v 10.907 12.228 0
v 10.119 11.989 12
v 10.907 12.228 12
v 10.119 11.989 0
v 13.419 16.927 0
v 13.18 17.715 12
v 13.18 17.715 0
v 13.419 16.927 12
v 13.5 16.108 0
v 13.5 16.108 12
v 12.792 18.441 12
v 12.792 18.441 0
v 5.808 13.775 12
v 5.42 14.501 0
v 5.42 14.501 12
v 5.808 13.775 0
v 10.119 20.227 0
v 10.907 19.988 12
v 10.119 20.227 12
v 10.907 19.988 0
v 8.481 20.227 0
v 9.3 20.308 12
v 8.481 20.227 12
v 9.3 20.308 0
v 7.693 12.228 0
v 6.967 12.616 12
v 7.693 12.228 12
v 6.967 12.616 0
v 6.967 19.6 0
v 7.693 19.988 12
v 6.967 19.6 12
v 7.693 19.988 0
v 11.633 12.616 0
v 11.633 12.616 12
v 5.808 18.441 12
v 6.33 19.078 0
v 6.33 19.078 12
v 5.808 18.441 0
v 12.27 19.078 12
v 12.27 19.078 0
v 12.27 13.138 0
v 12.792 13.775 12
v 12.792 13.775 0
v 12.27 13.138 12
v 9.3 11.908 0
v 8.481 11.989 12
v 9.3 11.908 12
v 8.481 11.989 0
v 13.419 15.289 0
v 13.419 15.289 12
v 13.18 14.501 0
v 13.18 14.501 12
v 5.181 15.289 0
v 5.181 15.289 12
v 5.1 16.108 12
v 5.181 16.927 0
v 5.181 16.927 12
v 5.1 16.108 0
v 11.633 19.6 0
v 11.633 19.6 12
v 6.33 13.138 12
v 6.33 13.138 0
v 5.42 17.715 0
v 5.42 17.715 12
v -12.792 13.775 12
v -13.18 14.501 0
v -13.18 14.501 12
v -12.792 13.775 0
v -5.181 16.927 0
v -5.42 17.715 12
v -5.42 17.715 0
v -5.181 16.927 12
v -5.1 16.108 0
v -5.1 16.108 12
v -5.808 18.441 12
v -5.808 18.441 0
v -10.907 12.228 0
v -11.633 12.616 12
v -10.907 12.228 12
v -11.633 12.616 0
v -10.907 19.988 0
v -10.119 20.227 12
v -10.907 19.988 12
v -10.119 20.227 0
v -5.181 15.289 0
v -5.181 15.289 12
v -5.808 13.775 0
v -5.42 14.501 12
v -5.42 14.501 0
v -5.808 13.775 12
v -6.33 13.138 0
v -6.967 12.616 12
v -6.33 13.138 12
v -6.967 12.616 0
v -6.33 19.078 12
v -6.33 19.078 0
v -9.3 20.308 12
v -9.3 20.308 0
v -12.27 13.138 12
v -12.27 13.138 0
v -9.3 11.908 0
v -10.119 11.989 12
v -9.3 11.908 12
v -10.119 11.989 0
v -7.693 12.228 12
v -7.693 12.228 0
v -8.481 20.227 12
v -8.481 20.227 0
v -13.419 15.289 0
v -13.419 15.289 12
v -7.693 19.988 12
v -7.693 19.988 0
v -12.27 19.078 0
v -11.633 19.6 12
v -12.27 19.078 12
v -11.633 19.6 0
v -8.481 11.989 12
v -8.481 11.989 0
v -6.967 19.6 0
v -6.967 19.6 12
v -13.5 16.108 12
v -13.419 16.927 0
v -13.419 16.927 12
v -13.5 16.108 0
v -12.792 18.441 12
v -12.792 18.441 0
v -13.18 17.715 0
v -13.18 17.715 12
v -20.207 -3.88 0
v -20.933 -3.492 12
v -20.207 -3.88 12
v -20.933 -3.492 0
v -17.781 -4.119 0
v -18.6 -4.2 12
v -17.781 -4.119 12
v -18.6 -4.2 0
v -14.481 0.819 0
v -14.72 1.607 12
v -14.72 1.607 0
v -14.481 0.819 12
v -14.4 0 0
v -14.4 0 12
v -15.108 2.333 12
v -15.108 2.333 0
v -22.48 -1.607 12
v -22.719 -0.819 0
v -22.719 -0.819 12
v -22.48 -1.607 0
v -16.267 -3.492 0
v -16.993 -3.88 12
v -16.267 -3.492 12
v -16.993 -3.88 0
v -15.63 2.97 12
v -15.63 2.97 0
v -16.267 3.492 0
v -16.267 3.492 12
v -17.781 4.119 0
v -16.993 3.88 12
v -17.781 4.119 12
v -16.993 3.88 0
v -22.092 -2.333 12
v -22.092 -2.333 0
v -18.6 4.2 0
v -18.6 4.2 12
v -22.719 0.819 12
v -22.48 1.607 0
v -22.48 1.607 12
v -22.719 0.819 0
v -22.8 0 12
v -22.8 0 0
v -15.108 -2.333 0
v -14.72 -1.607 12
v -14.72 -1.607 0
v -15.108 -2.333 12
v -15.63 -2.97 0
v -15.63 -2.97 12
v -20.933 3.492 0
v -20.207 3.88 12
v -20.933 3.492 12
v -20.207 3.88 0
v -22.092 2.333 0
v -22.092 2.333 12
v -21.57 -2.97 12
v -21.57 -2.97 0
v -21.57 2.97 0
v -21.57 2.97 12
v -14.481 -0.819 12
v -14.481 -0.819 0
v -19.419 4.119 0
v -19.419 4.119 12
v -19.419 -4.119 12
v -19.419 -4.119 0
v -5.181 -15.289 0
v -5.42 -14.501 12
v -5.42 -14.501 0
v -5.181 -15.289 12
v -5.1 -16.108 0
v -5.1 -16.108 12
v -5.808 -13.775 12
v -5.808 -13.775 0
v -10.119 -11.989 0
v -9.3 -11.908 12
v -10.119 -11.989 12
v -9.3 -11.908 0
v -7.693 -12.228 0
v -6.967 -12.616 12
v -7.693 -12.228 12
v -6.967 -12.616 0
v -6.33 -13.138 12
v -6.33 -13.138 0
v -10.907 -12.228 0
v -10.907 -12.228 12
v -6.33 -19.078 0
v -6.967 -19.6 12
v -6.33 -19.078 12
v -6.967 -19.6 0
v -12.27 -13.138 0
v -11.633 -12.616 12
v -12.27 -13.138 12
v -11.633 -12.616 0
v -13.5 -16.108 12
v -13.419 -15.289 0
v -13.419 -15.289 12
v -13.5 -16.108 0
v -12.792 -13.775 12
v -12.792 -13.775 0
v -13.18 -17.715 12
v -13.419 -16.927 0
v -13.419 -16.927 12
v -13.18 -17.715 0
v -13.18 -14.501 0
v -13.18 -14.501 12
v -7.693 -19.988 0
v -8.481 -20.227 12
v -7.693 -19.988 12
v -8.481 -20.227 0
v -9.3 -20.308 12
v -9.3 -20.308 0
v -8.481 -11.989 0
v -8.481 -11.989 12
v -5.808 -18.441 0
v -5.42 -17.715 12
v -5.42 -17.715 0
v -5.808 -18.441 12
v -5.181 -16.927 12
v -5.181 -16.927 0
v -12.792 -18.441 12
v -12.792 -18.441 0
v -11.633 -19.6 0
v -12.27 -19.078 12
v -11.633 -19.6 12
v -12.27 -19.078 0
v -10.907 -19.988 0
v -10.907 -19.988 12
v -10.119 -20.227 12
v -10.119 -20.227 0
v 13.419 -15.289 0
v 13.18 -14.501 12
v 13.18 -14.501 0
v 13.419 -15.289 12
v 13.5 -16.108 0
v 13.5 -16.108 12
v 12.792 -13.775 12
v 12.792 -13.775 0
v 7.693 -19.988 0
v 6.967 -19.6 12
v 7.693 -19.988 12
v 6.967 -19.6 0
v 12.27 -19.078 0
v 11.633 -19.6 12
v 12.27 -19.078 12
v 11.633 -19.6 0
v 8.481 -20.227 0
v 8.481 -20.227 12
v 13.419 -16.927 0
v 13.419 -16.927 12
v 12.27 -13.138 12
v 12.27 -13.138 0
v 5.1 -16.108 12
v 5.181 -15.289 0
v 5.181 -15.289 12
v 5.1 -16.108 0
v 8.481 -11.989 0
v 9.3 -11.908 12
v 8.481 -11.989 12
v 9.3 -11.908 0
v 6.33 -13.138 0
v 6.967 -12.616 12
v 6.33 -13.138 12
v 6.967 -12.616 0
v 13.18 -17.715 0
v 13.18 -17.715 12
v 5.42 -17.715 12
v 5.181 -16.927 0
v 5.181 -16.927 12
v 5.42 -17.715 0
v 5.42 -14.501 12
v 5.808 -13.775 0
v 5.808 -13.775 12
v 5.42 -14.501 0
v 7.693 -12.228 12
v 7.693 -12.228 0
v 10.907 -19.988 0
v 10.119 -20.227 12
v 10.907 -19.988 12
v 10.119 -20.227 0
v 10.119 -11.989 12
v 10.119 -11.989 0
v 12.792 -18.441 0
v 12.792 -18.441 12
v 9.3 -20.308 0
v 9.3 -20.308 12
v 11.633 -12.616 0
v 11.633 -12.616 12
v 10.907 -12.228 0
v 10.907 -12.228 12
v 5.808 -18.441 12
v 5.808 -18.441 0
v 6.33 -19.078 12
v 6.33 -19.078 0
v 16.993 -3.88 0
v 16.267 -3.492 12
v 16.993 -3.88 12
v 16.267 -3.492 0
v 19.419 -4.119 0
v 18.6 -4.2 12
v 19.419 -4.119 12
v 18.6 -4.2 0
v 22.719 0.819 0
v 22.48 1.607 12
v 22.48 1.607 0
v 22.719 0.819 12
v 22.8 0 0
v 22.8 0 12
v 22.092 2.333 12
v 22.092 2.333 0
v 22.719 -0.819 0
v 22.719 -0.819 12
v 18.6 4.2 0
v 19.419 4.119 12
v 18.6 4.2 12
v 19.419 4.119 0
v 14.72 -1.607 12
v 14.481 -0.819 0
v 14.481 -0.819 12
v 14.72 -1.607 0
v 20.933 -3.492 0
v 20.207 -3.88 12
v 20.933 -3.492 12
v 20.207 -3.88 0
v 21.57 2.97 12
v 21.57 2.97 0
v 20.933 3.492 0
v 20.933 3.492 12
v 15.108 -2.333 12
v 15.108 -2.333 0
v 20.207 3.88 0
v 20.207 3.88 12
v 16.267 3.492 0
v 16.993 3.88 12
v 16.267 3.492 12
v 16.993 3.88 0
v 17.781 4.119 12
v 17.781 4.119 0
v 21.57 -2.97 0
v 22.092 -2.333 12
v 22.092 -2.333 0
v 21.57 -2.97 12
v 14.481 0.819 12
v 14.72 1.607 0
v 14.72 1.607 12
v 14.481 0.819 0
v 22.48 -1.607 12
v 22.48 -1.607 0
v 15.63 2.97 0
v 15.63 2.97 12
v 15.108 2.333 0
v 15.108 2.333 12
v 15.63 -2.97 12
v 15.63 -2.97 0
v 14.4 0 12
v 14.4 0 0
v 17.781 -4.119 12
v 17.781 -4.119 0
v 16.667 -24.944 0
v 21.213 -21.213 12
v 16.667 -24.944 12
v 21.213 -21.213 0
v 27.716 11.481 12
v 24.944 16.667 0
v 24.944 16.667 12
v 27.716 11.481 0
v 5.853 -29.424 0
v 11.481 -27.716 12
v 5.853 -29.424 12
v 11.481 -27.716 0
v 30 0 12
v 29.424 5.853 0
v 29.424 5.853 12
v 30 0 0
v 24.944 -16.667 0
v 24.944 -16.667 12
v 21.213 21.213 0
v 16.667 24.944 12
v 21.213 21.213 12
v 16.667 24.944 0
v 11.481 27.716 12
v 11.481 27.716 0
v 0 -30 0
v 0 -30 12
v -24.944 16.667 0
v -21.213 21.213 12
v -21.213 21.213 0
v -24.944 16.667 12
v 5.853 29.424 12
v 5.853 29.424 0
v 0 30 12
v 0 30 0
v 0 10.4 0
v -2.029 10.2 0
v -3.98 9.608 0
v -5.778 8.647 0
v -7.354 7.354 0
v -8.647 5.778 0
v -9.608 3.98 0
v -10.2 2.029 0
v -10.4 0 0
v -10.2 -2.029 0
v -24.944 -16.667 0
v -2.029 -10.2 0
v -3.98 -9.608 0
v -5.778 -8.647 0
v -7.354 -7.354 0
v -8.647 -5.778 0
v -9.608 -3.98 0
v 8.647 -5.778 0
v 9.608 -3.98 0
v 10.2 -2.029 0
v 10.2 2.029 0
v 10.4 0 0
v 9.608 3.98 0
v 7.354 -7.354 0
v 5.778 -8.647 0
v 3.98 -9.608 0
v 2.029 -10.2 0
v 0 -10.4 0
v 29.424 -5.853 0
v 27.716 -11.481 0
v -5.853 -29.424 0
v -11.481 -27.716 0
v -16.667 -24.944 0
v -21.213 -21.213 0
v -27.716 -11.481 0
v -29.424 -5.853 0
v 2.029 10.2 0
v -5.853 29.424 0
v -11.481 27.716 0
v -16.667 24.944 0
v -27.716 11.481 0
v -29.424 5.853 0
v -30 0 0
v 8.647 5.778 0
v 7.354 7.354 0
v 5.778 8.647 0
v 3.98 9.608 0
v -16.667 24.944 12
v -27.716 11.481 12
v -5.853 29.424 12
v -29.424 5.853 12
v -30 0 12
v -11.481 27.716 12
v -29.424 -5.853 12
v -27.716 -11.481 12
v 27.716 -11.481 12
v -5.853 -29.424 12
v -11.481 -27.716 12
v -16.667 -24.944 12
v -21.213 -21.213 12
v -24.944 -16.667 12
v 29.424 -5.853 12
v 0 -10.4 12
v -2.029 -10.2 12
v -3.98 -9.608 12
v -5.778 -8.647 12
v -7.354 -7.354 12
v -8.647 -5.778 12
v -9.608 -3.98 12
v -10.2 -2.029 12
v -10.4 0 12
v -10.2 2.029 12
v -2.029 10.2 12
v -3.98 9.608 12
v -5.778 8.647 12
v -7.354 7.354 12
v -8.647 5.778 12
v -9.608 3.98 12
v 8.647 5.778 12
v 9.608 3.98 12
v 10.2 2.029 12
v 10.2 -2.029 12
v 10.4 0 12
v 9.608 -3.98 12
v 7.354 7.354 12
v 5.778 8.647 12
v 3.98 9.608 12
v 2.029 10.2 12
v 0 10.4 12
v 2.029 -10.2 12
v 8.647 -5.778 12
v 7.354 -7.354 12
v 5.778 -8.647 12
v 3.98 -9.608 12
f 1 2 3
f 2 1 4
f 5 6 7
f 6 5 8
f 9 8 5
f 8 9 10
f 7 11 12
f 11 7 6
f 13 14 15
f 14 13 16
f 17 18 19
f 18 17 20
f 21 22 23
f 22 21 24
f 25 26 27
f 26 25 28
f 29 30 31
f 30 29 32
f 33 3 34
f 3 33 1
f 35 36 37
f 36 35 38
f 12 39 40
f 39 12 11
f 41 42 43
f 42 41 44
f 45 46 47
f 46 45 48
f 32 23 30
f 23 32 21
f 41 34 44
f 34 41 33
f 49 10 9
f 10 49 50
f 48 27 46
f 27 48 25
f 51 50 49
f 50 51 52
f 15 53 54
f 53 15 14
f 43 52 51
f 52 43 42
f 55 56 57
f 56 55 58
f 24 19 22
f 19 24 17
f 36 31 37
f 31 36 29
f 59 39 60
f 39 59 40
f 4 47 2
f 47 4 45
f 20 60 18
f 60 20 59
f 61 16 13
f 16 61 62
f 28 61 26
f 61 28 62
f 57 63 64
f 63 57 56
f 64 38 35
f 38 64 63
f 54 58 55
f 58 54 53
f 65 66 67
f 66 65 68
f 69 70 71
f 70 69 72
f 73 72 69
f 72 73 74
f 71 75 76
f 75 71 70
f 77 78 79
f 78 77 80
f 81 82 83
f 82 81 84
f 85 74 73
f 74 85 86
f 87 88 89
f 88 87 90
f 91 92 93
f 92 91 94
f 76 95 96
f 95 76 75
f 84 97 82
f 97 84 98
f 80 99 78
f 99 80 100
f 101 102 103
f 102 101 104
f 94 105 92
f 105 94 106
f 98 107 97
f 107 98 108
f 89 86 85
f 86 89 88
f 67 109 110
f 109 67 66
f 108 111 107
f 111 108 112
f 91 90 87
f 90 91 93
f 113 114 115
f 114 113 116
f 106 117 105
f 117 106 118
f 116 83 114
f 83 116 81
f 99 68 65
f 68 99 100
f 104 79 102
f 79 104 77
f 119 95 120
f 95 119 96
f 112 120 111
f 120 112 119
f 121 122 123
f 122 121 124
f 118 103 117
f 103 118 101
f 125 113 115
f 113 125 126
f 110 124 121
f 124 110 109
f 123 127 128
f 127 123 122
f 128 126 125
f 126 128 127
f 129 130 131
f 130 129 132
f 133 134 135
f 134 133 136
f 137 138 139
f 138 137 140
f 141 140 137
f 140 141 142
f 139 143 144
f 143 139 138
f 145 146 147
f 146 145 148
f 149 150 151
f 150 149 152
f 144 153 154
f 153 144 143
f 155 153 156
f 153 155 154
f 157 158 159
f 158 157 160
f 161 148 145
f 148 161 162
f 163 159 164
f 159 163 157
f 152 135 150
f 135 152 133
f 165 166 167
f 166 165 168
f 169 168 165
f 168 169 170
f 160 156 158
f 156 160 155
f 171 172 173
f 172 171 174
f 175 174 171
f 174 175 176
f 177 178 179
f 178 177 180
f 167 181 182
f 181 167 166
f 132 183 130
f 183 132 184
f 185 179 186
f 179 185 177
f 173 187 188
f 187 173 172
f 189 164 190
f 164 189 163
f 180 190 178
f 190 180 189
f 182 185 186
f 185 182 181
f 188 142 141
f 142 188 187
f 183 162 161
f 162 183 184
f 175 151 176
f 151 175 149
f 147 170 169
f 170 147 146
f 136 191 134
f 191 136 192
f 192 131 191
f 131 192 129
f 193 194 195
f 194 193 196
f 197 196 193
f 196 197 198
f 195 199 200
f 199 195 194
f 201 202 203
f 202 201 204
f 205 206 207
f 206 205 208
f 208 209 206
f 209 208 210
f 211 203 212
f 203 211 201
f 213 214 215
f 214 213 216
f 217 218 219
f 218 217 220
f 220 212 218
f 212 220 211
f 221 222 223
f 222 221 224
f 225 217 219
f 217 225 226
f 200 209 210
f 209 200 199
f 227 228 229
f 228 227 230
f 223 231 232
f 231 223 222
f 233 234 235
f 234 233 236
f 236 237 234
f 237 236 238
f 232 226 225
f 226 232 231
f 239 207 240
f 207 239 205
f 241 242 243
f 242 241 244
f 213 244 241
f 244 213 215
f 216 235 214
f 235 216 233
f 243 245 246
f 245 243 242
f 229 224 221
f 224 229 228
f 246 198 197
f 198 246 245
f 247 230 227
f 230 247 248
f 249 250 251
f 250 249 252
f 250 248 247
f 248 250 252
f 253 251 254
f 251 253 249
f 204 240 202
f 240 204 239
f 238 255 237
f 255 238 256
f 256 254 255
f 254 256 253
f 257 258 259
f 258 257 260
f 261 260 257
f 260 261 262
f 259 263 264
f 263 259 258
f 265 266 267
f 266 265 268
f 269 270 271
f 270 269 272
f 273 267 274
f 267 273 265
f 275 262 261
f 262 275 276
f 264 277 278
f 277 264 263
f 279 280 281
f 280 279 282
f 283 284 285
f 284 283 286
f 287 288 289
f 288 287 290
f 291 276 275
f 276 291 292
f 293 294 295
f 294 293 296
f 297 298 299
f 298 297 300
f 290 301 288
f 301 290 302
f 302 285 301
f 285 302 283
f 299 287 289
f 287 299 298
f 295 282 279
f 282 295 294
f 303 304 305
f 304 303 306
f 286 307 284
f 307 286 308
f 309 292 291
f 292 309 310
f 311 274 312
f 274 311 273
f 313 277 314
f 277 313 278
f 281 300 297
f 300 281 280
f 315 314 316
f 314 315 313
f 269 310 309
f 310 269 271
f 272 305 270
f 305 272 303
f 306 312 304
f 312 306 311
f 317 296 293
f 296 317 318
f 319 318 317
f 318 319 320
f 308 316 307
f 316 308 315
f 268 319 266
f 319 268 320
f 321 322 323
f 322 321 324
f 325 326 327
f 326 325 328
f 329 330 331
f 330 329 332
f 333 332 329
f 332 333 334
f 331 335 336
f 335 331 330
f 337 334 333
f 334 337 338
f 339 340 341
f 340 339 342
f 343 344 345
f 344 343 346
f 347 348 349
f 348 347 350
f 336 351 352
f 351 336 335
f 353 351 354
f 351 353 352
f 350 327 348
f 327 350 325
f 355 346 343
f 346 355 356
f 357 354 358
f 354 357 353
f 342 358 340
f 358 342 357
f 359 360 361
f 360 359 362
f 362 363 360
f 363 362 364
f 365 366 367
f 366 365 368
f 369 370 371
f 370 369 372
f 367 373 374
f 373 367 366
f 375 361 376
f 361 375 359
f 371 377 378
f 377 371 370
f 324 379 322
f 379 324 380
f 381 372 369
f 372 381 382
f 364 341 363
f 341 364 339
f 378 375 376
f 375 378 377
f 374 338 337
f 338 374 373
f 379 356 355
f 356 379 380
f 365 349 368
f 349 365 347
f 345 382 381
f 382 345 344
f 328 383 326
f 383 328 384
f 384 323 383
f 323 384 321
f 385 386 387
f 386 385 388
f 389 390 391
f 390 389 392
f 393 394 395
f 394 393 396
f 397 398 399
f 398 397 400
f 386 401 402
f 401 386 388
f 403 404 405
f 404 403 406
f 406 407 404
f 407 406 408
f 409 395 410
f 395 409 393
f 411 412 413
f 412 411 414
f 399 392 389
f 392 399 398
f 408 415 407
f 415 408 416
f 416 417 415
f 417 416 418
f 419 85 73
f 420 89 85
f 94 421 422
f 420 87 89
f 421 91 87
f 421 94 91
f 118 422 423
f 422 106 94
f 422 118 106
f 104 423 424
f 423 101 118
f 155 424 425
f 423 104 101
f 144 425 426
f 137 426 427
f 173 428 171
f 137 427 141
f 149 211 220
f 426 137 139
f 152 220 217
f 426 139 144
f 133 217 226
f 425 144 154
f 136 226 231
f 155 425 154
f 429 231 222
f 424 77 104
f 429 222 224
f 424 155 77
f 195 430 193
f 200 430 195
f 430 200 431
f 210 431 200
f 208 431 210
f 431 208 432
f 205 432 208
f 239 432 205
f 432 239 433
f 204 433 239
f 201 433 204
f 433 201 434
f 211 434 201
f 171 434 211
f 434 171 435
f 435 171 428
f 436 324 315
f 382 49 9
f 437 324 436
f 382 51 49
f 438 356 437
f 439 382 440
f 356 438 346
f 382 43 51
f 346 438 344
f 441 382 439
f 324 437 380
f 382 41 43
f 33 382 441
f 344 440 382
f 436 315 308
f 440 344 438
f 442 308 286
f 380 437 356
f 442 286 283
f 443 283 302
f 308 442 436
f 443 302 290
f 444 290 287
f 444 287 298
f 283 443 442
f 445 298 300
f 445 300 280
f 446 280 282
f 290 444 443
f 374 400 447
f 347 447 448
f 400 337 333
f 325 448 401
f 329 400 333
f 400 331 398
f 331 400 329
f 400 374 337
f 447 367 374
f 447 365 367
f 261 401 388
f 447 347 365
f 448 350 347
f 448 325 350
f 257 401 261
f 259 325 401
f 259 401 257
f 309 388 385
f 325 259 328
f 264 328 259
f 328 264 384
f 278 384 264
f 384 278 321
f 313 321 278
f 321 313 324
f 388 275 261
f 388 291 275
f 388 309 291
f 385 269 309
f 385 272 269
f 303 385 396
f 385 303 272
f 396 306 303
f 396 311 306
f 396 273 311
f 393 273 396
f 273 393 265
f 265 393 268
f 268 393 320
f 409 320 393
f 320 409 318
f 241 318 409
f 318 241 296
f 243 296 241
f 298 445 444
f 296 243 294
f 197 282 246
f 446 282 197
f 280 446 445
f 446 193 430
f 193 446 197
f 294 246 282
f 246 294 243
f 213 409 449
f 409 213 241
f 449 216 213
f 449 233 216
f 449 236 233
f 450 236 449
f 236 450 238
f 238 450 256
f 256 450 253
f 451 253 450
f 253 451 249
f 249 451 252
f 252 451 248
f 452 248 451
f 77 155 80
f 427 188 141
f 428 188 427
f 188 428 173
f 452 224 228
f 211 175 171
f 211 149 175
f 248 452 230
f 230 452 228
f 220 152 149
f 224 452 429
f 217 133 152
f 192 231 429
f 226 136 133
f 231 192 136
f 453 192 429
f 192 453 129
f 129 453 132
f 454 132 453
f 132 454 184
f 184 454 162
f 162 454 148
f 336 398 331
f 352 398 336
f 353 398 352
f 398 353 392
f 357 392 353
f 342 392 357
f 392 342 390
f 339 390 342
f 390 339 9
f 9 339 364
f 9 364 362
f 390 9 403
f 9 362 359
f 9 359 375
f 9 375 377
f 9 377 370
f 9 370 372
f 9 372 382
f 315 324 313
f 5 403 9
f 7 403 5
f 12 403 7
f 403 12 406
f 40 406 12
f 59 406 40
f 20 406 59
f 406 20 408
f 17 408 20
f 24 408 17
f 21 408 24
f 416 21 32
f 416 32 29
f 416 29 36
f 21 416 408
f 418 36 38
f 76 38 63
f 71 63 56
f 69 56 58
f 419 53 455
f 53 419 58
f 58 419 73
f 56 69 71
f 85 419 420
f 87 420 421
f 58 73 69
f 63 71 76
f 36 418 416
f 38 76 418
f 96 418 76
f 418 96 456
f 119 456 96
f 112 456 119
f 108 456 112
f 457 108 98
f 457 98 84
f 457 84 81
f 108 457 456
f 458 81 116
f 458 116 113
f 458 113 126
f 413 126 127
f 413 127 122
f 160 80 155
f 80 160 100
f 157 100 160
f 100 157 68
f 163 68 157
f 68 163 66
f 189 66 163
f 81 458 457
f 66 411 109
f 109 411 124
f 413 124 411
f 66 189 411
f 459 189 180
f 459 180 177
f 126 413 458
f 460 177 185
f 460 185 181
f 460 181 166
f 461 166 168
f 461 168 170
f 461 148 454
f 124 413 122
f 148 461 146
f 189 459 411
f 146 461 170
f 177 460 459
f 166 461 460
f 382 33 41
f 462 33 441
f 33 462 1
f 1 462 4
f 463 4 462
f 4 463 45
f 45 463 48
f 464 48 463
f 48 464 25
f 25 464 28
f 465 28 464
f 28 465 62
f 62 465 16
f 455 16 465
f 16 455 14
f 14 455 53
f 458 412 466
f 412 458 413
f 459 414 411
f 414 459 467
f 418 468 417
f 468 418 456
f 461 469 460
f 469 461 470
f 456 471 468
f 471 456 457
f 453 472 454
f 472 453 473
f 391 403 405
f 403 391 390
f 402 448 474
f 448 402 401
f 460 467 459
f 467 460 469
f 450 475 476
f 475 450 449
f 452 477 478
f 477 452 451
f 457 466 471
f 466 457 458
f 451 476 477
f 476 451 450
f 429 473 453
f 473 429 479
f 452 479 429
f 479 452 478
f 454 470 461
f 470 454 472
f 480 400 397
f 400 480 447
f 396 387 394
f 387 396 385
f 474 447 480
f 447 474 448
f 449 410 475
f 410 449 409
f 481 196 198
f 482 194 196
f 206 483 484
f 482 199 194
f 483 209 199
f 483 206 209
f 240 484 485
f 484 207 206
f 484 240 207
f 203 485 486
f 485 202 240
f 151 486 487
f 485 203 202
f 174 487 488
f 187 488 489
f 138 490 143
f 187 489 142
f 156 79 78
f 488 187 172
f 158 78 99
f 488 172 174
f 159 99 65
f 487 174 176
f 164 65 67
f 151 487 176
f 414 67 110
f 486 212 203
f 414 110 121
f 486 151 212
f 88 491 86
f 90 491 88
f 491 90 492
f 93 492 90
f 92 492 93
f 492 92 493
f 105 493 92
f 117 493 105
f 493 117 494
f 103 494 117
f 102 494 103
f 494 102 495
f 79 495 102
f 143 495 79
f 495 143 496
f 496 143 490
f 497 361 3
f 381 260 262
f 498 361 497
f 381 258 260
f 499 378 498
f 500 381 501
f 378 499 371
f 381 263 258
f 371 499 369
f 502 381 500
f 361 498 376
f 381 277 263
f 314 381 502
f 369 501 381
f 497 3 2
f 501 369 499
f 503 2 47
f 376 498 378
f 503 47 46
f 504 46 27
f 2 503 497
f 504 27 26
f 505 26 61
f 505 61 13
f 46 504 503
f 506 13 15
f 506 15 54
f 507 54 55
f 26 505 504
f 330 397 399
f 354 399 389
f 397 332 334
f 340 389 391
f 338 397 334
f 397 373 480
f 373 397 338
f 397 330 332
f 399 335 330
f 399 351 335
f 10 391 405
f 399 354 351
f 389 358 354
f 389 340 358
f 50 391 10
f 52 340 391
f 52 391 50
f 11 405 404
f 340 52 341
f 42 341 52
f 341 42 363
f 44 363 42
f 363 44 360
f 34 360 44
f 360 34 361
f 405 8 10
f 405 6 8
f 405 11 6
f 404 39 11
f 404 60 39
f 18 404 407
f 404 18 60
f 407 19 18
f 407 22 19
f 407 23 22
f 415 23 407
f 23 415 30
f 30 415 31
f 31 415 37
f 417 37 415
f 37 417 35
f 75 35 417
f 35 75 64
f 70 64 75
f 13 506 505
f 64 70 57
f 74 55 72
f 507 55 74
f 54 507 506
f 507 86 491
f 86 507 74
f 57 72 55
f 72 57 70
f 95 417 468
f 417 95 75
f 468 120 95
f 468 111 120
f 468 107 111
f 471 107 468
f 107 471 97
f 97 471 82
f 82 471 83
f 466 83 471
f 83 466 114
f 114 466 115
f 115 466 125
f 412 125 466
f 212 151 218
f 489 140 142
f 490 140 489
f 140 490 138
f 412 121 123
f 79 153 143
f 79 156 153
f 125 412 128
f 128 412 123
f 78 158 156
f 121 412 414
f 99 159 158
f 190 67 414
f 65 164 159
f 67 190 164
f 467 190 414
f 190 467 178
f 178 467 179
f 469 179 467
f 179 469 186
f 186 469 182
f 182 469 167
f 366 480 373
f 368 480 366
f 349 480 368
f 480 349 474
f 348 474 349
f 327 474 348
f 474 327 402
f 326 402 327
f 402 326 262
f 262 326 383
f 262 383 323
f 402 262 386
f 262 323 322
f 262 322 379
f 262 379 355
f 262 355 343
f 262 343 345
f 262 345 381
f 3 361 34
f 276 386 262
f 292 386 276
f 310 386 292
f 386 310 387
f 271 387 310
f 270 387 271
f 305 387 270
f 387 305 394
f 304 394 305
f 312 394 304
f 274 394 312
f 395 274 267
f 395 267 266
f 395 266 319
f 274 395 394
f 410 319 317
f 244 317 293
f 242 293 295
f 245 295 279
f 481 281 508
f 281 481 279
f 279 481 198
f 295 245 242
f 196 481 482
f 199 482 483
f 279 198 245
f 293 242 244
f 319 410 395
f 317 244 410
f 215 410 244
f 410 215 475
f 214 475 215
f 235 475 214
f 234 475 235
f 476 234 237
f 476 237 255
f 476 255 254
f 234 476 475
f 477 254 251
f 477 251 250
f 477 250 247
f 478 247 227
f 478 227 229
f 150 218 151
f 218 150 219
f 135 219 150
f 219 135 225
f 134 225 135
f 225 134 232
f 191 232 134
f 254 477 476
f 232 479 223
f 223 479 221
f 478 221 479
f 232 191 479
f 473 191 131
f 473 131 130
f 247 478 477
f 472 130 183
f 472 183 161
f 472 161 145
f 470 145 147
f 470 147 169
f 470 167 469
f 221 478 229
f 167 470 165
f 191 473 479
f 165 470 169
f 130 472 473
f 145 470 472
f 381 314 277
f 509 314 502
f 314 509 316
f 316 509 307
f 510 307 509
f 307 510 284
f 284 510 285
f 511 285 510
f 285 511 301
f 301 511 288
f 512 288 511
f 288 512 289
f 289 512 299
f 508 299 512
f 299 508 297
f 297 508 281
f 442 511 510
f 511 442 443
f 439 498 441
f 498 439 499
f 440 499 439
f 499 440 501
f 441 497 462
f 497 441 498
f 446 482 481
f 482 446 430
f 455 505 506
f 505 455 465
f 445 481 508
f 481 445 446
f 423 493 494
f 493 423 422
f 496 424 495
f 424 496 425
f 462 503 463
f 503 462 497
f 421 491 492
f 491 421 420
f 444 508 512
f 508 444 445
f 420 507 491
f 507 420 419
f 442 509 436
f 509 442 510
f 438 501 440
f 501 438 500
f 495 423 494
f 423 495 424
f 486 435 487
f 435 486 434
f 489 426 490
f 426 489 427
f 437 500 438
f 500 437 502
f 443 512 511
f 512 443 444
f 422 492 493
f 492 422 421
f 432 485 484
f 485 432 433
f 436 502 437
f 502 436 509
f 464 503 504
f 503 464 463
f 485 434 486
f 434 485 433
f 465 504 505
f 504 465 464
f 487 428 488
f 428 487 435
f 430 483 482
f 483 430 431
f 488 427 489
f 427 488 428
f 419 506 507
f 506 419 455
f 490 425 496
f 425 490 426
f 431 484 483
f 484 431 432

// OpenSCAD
$fn = 32;

// ----------------------------------------------------------------------
// Flange Ø60 x 12
// 6 holes on a Ø37.2 bolt circle, bolted joints
// ----------------------------------------------------------------------

// --- parameters (mm) ---
flange_d = 60;   // outside diameter of the flange
thickness = 12;  // flange thickness
holes = 6;       // number of bolt holes
pcd = 37.2;      // bolt circle diameter
start_deg = 60;  // angle of the first hole, from +X
hole_d = 8.4;    // bolt hole diameter
bore_d = 20.8;   // central through bore
hub_d = 32.8;    // hub outside diameter
hub_h = 0;       // hub height above the flange face (0 = no hub)

// --- derived feature positions (mm) ---
height = thickness + hub_h;  // = 12   overall height of the part
pcd_r = pcd / 2;             // = 18.6   bolt circle radius
hole_step = 360 / holes;     // = 60   angular pitch
feature_centers = [
  [pcd_r * cos(start_deg + 0 * hole_step), pcd_r * sin(start_deg + 0 * hole_step)],
  [pcd_r * cos(start_deg + 1 * hole_step), pcd_r * sin(start_deg + 1 * hole_step)],
  [pcd_r * cos(start_deg + 2 * hole_step), pcd_r * sin(start_deg + 2 * hole_step)],
  [pcd_r * cos(start_deg + 3 * hole_step), pcd_r * sin(start_deg + 3 * hole_step)],
  [pcd_r * cos(start_deg + 4 * hole_step), pcd_r * sin(start_deg + 4 * hole_step)],
  [pcd_r * cos(start_deg + 5 * hole_step), pcd_r * sin(start_deg + 5 * hole_step)]
];   // bolt hole centres on the pitch circle

// flange disc, every hole and the bore cut straight through
difference() {
  union() {
    cylinder(d = flange_d, h = thickness);
  }
  translate([0, 0, -1]) cylinder(d = bore_d, h = height + 2);  // bore, through
  for (centre = feature_centers)
    translate([centre[0], centre[1], -1]) cylinder(d = hole_d, h = thickness + 2);
}
